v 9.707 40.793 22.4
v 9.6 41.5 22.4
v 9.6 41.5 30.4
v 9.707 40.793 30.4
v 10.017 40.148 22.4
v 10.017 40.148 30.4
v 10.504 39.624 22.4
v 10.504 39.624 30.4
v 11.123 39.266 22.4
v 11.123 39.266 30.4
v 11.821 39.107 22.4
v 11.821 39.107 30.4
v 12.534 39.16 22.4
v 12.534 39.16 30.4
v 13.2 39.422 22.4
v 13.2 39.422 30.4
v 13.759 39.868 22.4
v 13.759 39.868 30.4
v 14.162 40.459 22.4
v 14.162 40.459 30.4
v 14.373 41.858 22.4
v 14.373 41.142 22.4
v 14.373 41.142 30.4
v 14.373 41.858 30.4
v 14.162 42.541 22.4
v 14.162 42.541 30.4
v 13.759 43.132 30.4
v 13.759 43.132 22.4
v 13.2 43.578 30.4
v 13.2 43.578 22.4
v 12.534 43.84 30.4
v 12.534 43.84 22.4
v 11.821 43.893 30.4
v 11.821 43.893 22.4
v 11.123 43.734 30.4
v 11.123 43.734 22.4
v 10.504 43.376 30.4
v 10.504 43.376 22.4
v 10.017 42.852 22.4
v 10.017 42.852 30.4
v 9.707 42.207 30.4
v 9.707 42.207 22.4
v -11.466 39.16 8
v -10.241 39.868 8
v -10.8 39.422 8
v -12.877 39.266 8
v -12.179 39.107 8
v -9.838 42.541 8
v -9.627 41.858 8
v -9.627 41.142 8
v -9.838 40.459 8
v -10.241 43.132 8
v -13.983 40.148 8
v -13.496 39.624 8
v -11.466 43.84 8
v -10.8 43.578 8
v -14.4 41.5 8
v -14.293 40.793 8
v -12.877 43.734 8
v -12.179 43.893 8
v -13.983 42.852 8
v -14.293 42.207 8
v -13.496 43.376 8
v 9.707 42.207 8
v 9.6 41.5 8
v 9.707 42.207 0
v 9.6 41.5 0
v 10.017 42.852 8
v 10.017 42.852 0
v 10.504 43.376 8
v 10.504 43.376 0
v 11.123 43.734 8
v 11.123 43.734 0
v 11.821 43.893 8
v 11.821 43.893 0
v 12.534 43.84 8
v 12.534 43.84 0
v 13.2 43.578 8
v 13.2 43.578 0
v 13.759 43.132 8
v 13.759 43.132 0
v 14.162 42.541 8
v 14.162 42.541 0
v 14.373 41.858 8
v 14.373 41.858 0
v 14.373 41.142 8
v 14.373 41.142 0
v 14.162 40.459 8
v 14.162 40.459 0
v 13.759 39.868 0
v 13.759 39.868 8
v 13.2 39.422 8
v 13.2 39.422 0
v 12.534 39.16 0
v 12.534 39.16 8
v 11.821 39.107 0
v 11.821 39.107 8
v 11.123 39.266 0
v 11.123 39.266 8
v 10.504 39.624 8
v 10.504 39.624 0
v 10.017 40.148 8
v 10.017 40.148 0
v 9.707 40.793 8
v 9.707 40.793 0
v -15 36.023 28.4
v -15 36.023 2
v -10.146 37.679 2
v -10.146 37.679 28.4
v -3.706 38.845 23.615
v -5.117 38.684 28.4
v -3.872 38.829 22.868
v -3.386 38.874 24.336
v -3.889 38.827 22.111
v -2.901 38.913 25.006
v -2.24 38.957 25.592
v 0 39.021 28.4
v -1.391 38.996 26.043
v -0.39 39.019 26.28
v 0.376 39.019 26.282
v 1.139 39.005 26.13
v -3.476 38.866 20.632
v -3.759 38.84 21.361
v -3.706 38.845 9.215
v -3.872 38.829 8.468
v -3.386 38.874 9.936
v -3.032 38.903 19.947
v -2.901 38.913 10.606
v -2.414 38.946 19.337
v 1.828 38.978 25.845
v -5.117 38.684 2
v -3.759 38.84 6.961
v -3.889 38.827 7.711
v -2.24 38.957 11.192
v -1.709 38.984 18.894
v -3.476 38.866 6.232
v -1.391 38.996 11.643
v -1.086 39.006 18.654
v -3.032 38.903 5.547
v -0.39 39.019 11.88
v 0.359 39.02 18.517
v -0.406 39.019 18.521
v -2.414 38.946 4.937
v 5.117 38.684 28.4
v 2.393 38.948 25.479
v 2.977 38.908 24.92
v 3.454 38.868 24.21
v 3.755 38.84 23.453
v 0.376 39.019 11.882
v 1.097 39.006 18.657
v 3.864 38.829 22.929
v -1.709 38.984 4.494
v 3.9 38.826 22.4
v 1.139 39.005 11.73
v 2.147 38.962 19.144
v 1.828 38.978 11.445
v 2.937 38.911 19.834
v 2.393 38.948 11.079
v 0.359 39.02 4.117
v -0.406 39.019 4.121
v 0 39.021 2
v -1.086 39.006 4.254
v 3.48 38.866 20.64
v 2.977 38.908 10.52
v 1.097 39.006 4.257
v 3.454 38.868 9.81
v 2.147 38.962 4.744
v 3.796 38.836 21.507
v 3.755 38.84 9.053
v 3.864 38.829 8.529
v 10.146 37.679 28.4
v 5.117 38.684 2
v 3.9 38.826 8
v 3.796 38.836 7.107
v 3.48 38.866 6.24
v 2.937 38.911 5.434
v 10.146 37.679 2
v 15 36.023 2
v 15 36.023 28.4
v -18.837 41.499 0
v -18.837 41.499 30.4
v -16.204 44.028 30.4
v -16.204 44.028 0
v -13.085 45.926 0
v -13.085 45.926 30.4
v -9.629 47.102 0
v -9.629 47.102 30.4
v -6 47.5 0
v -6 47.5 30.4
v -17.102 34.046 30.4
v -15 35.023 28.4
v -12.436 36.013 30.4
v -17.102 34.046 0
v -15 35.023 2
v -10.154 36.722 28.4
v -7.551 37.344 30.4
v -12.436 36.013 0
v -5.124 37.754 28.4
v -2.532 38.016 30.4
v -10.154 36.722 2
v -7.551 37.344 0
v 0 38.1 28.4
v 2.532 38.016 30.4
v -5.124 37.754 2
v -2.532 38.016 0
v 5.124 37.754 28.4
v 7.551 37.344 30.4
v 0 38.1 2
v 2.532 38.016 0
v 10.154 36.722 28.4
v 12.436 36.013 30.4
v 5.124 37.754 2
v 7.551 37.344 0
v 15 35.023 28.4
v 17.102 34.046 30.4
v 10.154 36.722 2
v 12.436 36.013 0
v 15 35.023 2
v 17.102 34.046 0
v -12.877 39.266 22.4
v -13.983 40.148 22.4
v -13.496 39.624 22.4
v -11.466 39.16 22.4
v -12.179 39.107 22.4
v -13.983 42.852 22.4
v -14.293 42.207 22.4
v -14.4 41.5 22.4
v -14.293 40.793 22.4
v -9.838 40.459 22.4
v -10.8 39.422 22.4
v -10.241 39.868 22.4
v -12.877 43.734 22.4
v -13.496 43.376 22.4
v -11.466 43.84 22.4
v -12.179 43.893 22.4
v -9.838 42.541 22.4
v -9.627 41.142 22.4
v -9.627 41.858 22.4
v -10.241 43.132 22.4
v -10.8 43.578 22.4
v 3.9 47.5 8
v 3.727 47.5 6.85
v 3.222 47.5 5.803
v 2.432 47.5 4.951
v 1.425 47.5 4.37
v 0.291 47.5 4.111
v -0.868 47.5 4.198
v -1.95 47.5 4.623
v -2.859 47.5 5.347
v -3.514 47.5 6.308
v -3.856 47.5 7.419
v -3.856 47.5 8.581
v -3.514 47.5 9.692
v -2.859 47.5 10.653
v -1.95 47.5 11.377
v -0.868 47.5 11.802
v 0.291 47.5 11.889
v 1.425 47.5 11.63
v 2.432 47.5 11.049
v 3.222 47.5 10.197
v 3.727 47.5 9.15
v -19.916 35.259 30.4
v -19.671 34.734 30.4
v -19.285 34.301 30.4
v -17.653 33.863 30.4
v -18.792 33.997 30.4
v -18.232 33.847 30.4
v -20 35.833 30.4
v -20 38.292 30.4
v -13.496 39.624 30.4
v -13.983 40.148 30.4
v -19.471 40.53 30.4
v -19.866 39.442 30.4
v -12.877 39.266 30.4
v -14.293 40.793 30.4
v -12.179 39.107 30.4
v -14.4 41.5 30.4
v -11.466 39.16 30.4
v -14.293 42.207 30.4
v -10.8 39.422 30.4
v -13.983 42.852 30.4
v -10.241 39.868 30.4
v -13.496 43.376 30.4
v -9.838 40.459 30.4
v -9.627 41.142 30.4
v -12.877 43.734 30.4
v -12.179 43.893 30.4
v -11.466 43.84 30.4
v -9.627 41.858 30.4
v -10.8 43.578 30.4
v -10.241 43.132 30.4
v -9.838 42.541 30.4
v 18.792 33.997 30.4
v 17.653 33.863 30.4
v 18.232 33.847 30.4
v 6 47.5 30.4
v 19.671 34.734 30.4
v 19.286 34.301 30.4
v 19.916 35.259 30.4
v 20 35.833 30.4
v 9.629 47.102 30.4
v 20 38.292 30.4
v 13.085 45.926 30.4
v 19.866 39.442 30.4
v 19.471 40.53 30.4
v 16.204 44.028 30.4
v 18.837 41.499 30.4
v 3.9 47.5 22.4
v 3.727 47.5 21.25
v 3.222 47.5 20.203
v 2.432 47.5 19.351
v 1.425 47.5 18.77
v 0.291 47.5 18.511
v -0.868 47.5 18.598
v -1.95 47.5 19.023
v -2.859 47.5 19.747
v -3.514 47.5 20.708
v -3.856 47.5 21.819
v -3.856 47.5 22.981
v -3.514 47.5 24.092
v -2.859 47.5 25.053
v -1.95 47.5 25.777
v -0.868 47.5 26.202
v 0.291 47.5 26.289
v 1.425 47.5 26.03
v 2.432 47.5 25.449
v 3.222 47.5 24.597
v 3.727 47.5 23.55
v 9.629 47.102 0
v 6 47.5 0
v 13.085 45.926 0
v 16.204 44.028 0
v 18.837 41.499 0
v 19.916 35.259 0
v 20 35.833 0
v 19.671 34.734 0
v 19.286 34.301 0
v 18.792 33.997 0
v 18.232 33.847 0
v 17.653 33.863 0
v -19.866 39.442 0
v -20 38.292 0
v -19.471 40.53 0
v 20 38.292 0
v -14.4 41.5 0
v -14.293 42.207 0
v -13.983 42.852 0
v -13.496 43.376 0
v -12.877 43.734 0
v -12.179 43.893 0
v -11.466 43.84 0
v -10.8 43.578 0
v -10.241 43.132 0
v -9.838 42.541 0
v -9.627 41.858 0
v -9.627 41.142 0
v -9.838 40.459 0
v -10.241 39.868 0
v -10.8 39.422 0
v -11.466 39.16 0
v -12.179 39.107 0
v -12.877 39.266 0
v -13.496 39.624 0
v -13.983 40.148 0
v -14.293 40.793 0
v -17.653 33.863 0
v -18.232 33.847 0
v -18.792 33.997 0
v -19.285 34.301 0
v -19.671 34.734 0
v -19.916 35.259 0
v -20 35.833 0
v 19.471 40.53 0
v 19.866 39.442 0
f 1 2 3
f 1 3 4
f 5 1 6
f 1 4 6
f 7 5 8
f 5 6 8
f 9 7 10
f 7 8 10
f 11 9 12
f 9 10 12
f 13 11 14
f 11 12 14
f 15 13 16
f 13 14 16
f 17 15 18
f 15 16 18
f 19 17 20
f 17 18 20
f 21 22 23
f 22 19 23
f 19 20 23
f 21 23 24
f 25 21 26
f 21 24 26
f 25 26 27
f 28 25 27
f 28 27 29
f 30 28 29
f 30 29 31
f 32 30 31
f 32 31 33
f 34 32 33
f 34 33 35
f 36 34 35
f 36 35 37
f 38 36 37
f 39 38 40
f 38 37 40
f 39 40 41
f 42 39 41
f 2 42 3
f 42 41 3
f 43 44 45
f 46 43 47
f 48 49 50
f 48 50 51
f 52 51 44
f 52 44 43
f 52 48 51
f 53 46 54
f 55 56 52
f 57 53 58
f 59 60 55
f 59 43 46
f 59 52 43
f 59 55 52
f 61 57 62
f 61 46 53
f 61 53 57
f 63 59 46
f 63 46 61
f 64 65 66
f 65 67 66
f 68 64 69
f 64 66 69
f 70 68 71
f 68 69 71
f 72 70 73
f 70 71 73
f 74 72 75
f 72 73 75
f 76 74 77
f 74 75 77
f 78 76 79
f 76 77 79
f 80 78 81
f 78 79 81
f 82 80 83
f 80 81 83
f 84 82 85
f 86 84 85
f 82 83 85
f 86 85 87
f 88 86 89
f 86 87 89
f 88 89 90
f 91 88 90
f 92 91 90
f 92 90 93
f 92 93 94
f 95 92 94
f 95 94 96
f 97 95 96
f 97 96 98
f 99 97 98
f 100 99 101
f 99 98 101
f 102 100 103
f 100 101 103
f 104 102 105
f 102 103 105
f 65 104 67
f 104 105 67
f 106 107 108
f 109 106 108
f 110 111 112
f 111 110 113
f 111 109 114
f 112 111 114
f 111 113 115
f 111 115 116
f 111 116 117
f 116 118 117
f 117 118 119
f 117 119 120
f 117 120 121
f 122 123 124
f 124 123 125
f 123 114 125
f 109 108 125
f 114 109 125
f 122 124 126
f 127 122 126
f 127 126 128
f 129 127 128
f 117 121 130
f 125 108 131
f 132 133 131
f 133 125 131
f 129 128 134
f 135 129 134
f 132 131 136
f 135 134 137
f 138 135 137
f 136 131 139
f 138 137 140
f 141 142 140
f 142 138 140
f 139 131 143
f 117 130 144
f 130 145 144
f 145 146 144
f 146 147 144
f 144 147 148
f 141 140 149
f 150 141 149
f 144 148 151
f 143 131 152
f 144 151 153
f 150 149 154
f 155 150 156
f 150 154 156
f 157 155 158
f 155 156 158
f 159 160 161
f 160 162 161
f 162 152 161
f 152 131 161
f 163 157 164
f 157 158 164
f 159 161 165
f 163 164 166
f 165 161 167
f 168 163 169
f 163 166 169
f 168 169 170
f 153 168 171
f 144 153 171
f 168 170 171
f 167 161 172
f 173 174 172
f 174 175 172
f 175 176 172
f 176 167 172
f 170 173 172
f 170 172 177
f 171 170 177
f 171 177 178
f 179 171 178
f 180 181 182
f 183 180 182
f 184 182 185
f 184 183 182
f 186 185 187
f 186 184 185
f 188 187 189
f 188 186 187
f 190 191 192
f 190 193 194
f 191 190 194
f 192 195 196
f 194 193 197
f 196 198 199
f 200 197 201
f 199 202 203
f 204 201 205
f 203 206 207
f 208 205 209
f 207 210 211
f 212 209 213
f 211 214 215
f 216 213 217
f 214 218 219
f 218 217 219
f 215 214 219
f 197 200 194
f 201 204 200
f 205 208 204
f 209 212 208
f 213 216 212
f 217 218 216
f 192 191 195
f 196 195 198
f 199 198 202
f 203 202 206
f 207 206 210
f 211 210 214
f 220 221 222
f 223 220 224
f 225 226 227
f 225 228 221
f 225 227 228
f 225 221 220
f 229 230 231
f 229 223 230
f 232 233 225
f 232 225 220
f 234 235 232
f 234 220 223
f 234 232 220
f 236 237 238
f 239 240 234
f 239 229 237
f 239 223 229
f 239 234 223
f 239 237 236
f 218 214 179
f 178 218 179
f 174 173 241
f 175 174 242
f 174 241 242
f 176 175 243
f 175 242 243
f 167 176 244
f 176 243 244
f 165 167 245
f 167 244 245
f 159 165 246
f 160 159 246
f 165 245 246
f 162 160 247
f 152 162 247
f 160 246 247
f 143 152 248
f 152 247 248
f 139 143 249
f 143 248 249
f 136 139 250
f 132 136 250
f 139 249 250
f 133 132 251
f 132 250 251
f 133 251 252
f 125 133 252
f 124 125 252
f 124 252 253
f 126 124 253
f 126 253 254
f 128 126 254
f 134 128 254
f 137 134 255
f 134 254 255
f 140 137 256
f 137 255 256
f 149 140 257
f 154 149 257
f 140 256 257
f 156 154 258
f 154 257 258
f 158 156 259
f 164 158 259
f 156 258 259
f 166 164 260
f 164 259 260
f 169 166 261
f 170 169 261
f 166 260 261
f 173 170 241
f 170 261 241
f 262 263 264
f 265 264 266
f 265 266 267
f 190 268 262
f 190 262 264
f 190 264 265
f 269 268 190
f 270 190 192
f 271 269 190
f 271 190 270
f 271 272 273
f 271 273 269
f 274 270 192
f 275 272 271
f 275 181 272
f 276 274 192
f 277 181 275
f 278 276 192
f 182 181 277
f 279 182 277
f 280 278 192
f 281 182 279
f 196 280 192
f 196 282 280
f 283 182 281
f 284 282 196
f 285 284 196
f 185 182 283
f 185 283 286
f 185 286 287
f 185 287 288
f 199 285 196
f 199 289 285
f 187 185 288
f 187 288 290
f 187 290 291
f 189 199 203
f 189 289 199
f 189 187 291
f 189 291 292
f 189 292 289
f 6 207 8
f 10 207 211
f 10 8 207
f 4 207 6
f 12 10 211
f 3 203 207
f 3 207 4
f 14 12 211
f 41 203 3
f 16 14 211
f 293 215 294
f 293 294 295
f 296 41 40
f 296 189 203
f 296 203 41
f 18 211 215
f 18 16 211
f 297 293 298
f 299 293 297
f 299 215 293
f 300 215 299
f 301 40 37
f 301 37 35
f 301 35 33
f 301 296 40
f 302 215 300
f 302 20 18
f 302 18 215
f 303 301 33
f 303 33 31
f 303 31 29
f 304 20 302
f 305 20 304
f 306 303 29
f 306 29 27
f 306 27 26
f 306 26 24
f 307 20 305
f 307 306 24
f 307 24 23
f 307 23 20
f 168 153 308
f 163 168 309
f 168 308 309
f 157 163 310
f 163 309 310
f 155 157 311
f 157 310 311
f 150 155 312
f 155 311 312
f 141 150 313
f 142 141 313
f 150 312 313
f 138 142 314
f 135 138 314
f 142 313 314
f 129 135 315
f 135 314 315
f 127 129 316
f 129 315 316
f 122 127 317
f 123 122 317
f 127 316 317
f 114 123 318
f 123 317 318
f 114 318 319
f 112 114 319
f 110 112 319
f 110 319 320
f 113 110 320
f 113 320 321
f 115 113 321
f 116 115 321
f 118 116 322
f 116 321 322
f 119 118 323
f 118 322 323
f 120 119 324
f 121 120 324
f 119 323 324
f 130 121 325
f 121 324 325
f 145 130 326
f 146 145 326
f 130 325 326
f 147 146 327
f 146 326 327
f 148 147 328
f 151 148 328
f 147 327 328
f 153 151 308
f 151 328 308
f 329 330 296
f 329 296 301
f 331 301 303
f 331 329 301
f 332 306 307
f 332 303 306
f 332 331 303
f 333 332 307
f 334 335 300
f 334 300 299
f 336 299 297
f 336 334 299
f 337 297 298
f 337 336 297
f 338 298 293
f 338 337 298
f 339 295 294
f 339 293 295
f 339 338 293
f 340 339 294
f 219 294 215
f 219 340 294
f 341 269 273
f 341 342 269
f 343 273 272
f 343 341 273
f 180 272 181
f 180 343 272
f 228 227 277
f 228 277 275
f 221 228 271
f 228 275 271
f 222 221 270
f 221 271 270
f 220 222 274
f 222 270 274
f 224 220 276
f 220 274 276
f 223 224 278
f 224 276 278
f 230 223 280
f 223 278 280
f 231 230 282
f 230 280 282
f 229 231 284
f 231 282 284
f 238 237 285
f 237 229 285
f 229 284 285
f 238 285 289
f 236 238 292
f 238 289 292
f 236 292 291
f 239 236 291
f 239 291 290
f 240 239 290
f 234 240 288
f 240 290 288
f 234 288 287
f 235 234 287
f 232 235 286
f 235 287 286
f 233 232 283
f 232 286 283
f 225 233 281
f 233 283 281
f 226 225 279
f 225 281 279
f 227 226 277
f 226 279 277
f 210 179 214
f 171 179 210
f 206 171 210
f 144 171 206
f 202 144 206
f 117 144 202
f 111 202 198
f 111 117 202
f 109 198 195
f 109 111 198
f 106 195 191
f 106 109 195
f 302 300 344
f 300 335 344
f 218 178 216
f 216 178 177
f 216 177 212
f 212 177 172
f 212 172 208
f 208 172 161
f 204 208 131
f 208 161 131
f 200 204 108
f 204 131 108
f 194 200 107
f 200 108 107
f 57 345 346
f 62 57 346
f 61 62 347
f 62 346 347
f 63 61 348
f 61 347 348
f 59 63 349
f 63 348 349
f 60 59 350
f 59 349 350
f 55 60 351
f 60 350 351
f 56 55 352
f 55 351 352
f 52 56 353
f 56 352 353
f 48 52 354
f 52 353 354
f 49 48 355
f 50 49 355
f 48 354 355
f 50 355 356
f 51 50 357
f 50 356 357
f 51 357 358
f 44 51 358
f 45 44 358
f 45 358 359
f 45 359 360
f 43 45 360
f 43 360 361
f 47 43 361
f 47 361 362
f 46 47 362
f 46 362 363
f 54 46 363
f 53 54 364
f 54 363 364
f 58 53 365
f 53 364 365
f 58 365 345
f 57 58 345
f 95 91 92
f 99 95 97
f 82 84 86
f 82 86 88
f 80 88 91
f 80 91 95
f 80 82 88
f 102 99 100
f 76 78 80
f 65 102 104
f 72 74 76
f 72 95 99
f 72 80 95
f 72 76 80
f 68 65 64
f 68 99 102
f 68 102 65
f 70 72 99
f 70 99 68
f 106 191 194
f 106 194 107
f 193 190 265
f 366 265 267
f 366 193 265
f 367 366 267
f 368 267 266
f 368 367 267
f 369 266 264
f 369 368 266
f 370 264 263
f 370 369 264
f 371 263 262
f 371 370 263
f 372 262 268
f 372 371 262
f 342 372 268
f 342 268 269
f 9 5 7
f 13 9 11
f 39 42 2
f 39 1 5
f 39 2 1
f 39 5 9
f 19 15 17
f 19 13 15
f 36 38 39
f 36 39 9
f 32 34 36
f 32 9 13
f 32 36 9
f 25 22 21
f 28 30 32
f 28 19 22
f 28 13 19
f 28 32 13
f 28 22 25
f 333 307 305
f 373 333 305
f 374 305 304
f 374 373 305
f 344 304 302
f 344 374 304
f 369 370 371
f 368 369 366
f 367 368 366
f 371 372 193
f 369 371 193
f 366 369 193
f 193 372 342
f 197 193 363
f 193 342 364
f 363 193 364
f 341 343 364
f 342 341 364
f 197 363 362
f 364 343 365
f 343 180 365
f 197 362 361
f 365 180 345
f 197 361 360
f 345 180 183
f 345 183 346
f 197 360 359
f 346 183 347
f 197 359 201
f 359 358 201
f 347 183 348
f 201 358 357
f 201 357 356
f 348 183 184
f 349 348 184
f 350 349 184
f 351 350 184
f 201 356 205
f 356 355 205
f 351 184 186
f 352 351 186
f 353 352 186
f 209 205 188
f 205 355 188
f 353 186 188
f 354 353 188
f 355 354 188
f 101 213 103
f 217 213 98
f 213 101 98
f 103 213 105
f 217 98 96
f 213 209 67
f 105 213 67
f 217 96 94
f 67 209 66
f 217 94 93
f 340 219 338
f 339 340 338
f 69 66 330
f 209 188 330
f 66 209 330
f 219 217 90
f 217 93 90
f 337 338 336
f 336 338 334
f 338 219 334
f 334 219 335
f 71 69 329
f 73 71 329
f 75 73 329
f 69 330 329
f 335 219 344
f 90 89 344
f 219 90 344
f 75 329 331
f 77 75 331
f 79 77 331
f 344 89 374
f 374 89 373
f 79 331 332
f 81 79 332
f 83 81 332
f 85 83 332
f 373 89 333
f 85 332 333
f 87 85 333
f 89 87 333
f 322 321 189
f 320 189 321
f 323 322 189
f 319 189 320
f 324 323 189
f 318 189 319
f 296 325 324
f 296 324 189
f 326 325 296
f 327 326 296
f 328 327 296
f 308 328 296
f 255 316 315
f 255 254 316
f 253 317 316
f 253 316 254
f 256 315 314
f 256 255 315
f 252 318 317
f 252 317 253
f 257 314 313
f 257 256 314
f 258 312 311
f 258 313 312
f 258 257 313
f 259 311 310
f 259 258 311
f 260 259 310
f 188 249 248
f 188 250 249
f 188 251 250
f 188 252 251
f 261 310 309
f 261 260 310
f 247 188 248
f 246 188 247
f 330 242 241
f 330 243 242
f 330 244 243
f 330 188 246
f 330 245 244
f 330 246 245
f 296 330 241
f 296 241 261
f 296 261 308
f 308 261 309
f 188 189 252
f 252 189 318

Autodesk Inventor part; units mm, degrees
ref_plane "YZ Plane" through (0, 0, 0) normal (1, 0, 0) x (0, 1, 0)
sketch "Sketch1" plane through (0, 0, 0) normal (0, 0, 1) x (1, 0, 0)
  circle A0 centre (0, 0) radius 37.5 construction
  circle A1 centre (0, 0) radius 38.1
  line L0 (0, 0) -> (0, 82.8508) construction
  line L1 (-6, 47.5) -> (6, 47.5)
  line L2 (20, 35.8331) -> (20, 38.2923)
  line L3 (-20, 35.8331) -> (-20, 38.2923)
  arc A2 (-6, 47.5) -> (-18.8366, 41.4986) centre (-6, 30.7709) ccw
  arc A3 (18.8366, 41.4986) -> (6, 47.5) centre (6, 30.7709) ccw
  arc A4 (-18.8366, 41.4986) -> (-20, 38.2923) centre (-15, 38.2923) ccw
  arc A5 (20, 38.2923) -> (18.8366, 41.4986) centre (15, 38.2923) ccw
  arc A6 (17.1022, 34.0459) -> (-17.1022, 34.0459) centre (0, 0) ccw
  arc A7 (-20, 35.8331) -> (-17.1022, 34.0459) centre (-18, 35.8331) ccw
  arc A8 (17.1022, 34.0459) -> (20, 35.8331) centre (18, 35.8331) ccw
  point P0 (20, 32.4285)
  point P1 (20, 39.9285)
  point P2 (-20, 32.4285)
  point P3 (-20, 39.9285)
  point P4 (-17.1022, 34.0459)
  dimension "d0" = 75
  dimension "d1" = 0.6
  dimension "d22" = 12
  dimension "d23" = 6
  dimension "d24" = 47.5
  dimension "d25" = 7.5
  dimension "d26" = 7.5
  dimension "d27" = 40
  dimension "d28" = 20
  dimension "d29" = 5
  dimension "d30" = 2
extrude "Extrusion1" add sketch "Sketch1" along normal blind 30.4 contours A1 A7 L3 A4 A2 L1 A3 A5 L2 A8
sketch "Sketch2" plane through (-6, 47.5, 0) normal (0, 1, 0) x (1, 0, 0)
  line L0 (12, -30.4) -> (0, -30.4) projected
  line L1 (12, 0) -> (12, -30.4) projected
  line L2 (0, -30.4) -> (16.9706, -30.4) construction
  line L3 (12, -30.4) -> (24.8366, -30.4) projected
  line L4 (0, 0) -> (0, -30.4) projected
  line L5 (23.1022, 0) -> (-11.1022, 0) projected
  circle A0 centre (6, -22.4) radius 3.9
  circle A1 centre (6, -8) radius 3.9
  point P0 (6, 0)
  dimension "d34" = 7.8
  dimension "d35" = 7.8
  dimension "d38" = 12
  dimension "d39" = 6
  dimension "d40" = 6
  dimension "d41" = 8
  dimension "d42" = 8
extrude "Extrusion2" cut sketch "Sketch2" against normal blind 15 contours A0 | A1
ref_plane "Work Plane1" through (0, 0, 2) normal (0, 0, -1) x (-1, 0, 0)
sketch "Sketch3" plane through (0, 0, 2) normal (0, 0, -1) x (-1, 0, 0)
  arc A0 (17.1022, 34.0459) -> (-17.1022, 34.0459) centre (0, 0) ccw projected
  line L0 (-15, 35.023) -> (-15, 36.023)
  line L1 (15, 35.023) -> (15, 36.023)
  line L2 (0, 0) -> (0, 39.8883) construction
  arc A1 (15, 36.023) -> (-15, 36.023) centre (0, 0) ccw
  dimension "d44" = 1
  dimension "d45" = 30
  dimension "d46" = 15
extrude "Extrusion3" cut sketch "Sketch3" against normal blind 26.4
sketch "Sketch4" plane through (0, 0, 0) normal (0, 0, -1) x (-1, 0, 0)
  line L0 (-6, 47.5) -> (6, 47.5)
  circle A0 centre (-12, 41.5) radius 2.4
  line L1 (-6, 47.5) -> (6, 47.5) projected
  circle A1 centre (12, 41.5) radius 2.4
  point P0 (0, 0)
  dimension "d52" = 4.8
  dimension "d53" = 12
  dimension "d54" = 6
  dimension "d55" = 4.8
  dimension "d56" = 12
  dimension "d57" = 6
extrude "Extrusion4" cut sketch "Sketch4" against normal blind 8
ref_plane "Work Plane2" through (0, 0, 15.2) normal (0, 0, -1) x (-1, 0, 0)
mirror "Mirror1" about plane through (0, 0, 15.2) normal (0, 0, -1) of "Extrusion4"
equation "\"d23\" = 0.5 * d22"
equation "\"d28\" = 0.5 * d27"
equation "\"d35\" = d34"
equation "\"d39\" = 0.5 * d38"
equation "\"d40\" = 0.5 * d38"
equation "\"d42\" = d41"
equation "\"d46\" = 0.5 * d45"
equation "\"d56\" = d53"
equation "\"d57\" = d54"
properties part number "PipeHolder" material "ABS Plastic"
